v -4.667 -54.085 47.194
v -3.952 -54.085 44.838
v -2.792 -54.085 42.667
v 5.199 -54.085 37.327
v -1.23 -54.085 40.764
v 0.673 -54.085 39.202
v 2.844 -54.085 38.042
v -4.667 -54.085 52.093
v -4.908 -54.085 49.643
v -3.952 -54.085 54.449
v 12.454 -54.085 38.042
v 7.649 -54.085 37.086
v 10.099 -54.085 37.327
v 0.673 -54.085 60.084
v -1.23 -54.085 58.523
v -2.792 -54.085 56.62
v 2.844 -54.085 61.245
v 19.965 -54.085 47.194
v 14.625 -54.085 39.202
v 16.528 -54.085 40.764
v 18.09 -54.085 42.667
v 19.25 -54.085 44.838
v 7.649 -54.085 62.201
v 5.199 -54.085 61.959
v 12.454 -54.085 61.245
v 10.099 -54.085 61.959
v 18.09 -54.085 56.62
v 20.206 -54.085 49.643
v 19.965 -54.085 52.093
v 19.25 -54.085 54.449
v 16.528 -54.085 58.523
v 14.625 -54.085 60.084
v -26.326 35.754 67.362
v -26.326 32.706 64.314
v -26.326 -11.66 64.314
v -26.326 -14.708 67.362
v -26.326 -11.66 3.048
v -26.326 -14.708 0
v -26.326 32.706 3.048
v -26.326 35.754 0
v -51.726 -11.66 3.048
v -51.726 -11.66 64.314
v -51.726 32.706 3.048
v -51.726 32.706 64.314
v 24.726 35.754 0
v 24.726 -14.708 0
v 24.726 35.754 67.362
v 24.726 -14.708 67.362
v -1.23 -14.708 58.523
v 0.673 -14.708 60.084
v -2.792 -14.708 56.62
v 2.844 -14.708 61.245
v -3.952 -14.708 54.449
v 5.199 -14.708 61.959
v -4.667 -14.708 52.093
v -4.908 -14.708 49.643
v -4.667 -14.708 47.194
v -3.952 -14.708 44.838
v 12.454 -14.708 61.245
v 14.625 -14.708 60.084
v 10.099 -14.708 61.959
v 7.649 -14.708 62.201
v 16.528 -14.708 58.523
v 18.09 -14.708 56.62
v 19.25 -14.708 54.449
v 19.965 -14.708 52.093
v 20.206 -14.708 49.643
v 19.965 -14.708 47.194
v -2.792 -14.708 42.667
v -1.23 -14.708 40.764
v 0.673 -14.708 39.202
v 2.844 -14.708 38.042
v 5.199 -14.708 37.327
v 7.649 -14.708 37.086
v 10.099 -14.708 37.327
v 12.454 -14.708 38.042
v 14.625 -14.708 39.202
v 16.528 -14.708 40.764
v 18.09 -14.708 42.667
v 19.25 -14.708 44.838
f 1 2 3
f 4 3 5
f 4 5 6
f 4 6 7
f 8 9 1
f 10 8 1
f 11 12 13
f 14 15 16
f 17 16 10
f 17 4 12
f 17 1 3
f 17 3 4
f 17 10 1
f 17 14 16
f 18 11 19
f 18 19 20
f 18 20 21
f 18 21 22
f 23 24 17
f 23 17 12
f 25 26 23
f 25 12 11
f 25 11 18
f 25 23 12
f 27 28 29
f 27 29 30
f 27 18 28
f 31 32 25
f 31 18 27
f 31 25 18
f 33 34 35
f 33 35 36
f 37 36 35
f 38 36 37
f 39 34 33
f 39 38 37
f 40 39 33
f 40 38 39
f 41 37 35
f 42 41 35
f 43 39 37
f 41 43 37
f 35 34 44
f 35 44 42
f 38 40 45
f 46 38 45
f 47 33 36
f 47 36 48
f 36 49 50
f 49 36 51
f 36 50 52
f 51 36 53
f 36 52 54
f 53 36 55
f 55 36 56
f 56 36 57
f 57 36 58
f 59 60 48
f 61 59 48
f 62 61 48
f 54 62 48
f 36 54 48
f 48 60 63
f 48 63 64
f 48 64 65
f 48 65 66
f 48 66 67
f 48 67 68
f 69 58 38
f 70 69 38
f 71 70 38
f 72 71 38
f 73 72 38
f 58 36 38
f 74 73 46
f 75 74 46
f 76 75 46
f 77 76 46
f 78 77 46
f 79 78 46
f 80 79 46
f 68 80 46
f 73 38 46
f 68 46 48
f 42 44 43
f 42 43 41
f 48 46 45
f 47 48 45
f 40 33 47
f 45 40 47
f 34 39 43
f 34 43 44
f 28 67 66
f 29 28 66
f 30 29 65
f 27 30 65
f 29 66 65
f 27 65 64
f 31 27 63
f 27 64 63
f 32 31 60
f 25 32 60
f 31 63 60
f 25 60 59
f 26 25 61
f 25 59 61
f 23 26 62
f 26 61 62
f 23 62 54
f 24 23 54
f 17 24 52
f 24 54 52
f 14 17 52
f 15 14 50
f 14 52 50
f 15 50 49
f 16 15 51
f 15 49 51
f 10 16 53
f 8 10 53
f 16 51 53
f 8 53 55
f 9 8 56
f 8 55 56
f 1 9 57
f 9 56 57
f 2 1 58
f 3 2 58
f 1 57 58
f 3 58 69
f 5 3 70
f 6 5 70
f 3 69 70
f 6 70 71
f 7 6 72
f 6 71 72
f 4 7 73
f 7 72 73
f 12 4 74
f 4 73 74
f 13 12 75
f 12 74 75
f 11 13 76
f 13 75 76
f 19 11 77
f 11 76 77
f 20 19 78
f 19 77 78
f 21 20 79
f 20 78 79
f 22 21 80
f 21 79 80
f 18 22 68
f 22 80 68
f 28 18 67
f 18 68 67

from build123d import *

# Parameters (mm, degrees)
F0_W     = 51.0519817472
F0_H     = 50.4617840052
F1_DEPTH = 67.3618763685
F2_R     = 12.5571720672
F3_DEPTH = 39.3777489662
F4_W     = 44.3657840052
F4_H     = 61.2658763685
F5_DEPTH = 25.4


with BuildPart() as f1:
    # F0 (on Top) → F1 (new body)
    with BuildSketch(Plane.XY):
        with Locations((-0.7996745408, 10.5232298374)):
            Rectangle(F0_W, F0_H)
    extrude(amount=F1_DEPTH)

    # F2 (on face) → F3 (join)
    with BuildSketch(Plane.XZ.offset(14.7076621652)):
        with Locations((7.6489895582, 49.6433377266)):
            Circle(F2_R)
    extrude(amount=F3_DEPTH)

    # F4 (on face) → F5 (join)
    with BuildSketch(Plane(origin=(-26.3256654143, 0, 0), x_dir=(0, -1, 0), z_dir=(-1, 0, 0))):
        with Locations((-10.5232298374, 33.6809381843)):
            Rectangle(F4_W, F4_H)
    extrude(amount=F5_DEPTH)


solid = f1.part
